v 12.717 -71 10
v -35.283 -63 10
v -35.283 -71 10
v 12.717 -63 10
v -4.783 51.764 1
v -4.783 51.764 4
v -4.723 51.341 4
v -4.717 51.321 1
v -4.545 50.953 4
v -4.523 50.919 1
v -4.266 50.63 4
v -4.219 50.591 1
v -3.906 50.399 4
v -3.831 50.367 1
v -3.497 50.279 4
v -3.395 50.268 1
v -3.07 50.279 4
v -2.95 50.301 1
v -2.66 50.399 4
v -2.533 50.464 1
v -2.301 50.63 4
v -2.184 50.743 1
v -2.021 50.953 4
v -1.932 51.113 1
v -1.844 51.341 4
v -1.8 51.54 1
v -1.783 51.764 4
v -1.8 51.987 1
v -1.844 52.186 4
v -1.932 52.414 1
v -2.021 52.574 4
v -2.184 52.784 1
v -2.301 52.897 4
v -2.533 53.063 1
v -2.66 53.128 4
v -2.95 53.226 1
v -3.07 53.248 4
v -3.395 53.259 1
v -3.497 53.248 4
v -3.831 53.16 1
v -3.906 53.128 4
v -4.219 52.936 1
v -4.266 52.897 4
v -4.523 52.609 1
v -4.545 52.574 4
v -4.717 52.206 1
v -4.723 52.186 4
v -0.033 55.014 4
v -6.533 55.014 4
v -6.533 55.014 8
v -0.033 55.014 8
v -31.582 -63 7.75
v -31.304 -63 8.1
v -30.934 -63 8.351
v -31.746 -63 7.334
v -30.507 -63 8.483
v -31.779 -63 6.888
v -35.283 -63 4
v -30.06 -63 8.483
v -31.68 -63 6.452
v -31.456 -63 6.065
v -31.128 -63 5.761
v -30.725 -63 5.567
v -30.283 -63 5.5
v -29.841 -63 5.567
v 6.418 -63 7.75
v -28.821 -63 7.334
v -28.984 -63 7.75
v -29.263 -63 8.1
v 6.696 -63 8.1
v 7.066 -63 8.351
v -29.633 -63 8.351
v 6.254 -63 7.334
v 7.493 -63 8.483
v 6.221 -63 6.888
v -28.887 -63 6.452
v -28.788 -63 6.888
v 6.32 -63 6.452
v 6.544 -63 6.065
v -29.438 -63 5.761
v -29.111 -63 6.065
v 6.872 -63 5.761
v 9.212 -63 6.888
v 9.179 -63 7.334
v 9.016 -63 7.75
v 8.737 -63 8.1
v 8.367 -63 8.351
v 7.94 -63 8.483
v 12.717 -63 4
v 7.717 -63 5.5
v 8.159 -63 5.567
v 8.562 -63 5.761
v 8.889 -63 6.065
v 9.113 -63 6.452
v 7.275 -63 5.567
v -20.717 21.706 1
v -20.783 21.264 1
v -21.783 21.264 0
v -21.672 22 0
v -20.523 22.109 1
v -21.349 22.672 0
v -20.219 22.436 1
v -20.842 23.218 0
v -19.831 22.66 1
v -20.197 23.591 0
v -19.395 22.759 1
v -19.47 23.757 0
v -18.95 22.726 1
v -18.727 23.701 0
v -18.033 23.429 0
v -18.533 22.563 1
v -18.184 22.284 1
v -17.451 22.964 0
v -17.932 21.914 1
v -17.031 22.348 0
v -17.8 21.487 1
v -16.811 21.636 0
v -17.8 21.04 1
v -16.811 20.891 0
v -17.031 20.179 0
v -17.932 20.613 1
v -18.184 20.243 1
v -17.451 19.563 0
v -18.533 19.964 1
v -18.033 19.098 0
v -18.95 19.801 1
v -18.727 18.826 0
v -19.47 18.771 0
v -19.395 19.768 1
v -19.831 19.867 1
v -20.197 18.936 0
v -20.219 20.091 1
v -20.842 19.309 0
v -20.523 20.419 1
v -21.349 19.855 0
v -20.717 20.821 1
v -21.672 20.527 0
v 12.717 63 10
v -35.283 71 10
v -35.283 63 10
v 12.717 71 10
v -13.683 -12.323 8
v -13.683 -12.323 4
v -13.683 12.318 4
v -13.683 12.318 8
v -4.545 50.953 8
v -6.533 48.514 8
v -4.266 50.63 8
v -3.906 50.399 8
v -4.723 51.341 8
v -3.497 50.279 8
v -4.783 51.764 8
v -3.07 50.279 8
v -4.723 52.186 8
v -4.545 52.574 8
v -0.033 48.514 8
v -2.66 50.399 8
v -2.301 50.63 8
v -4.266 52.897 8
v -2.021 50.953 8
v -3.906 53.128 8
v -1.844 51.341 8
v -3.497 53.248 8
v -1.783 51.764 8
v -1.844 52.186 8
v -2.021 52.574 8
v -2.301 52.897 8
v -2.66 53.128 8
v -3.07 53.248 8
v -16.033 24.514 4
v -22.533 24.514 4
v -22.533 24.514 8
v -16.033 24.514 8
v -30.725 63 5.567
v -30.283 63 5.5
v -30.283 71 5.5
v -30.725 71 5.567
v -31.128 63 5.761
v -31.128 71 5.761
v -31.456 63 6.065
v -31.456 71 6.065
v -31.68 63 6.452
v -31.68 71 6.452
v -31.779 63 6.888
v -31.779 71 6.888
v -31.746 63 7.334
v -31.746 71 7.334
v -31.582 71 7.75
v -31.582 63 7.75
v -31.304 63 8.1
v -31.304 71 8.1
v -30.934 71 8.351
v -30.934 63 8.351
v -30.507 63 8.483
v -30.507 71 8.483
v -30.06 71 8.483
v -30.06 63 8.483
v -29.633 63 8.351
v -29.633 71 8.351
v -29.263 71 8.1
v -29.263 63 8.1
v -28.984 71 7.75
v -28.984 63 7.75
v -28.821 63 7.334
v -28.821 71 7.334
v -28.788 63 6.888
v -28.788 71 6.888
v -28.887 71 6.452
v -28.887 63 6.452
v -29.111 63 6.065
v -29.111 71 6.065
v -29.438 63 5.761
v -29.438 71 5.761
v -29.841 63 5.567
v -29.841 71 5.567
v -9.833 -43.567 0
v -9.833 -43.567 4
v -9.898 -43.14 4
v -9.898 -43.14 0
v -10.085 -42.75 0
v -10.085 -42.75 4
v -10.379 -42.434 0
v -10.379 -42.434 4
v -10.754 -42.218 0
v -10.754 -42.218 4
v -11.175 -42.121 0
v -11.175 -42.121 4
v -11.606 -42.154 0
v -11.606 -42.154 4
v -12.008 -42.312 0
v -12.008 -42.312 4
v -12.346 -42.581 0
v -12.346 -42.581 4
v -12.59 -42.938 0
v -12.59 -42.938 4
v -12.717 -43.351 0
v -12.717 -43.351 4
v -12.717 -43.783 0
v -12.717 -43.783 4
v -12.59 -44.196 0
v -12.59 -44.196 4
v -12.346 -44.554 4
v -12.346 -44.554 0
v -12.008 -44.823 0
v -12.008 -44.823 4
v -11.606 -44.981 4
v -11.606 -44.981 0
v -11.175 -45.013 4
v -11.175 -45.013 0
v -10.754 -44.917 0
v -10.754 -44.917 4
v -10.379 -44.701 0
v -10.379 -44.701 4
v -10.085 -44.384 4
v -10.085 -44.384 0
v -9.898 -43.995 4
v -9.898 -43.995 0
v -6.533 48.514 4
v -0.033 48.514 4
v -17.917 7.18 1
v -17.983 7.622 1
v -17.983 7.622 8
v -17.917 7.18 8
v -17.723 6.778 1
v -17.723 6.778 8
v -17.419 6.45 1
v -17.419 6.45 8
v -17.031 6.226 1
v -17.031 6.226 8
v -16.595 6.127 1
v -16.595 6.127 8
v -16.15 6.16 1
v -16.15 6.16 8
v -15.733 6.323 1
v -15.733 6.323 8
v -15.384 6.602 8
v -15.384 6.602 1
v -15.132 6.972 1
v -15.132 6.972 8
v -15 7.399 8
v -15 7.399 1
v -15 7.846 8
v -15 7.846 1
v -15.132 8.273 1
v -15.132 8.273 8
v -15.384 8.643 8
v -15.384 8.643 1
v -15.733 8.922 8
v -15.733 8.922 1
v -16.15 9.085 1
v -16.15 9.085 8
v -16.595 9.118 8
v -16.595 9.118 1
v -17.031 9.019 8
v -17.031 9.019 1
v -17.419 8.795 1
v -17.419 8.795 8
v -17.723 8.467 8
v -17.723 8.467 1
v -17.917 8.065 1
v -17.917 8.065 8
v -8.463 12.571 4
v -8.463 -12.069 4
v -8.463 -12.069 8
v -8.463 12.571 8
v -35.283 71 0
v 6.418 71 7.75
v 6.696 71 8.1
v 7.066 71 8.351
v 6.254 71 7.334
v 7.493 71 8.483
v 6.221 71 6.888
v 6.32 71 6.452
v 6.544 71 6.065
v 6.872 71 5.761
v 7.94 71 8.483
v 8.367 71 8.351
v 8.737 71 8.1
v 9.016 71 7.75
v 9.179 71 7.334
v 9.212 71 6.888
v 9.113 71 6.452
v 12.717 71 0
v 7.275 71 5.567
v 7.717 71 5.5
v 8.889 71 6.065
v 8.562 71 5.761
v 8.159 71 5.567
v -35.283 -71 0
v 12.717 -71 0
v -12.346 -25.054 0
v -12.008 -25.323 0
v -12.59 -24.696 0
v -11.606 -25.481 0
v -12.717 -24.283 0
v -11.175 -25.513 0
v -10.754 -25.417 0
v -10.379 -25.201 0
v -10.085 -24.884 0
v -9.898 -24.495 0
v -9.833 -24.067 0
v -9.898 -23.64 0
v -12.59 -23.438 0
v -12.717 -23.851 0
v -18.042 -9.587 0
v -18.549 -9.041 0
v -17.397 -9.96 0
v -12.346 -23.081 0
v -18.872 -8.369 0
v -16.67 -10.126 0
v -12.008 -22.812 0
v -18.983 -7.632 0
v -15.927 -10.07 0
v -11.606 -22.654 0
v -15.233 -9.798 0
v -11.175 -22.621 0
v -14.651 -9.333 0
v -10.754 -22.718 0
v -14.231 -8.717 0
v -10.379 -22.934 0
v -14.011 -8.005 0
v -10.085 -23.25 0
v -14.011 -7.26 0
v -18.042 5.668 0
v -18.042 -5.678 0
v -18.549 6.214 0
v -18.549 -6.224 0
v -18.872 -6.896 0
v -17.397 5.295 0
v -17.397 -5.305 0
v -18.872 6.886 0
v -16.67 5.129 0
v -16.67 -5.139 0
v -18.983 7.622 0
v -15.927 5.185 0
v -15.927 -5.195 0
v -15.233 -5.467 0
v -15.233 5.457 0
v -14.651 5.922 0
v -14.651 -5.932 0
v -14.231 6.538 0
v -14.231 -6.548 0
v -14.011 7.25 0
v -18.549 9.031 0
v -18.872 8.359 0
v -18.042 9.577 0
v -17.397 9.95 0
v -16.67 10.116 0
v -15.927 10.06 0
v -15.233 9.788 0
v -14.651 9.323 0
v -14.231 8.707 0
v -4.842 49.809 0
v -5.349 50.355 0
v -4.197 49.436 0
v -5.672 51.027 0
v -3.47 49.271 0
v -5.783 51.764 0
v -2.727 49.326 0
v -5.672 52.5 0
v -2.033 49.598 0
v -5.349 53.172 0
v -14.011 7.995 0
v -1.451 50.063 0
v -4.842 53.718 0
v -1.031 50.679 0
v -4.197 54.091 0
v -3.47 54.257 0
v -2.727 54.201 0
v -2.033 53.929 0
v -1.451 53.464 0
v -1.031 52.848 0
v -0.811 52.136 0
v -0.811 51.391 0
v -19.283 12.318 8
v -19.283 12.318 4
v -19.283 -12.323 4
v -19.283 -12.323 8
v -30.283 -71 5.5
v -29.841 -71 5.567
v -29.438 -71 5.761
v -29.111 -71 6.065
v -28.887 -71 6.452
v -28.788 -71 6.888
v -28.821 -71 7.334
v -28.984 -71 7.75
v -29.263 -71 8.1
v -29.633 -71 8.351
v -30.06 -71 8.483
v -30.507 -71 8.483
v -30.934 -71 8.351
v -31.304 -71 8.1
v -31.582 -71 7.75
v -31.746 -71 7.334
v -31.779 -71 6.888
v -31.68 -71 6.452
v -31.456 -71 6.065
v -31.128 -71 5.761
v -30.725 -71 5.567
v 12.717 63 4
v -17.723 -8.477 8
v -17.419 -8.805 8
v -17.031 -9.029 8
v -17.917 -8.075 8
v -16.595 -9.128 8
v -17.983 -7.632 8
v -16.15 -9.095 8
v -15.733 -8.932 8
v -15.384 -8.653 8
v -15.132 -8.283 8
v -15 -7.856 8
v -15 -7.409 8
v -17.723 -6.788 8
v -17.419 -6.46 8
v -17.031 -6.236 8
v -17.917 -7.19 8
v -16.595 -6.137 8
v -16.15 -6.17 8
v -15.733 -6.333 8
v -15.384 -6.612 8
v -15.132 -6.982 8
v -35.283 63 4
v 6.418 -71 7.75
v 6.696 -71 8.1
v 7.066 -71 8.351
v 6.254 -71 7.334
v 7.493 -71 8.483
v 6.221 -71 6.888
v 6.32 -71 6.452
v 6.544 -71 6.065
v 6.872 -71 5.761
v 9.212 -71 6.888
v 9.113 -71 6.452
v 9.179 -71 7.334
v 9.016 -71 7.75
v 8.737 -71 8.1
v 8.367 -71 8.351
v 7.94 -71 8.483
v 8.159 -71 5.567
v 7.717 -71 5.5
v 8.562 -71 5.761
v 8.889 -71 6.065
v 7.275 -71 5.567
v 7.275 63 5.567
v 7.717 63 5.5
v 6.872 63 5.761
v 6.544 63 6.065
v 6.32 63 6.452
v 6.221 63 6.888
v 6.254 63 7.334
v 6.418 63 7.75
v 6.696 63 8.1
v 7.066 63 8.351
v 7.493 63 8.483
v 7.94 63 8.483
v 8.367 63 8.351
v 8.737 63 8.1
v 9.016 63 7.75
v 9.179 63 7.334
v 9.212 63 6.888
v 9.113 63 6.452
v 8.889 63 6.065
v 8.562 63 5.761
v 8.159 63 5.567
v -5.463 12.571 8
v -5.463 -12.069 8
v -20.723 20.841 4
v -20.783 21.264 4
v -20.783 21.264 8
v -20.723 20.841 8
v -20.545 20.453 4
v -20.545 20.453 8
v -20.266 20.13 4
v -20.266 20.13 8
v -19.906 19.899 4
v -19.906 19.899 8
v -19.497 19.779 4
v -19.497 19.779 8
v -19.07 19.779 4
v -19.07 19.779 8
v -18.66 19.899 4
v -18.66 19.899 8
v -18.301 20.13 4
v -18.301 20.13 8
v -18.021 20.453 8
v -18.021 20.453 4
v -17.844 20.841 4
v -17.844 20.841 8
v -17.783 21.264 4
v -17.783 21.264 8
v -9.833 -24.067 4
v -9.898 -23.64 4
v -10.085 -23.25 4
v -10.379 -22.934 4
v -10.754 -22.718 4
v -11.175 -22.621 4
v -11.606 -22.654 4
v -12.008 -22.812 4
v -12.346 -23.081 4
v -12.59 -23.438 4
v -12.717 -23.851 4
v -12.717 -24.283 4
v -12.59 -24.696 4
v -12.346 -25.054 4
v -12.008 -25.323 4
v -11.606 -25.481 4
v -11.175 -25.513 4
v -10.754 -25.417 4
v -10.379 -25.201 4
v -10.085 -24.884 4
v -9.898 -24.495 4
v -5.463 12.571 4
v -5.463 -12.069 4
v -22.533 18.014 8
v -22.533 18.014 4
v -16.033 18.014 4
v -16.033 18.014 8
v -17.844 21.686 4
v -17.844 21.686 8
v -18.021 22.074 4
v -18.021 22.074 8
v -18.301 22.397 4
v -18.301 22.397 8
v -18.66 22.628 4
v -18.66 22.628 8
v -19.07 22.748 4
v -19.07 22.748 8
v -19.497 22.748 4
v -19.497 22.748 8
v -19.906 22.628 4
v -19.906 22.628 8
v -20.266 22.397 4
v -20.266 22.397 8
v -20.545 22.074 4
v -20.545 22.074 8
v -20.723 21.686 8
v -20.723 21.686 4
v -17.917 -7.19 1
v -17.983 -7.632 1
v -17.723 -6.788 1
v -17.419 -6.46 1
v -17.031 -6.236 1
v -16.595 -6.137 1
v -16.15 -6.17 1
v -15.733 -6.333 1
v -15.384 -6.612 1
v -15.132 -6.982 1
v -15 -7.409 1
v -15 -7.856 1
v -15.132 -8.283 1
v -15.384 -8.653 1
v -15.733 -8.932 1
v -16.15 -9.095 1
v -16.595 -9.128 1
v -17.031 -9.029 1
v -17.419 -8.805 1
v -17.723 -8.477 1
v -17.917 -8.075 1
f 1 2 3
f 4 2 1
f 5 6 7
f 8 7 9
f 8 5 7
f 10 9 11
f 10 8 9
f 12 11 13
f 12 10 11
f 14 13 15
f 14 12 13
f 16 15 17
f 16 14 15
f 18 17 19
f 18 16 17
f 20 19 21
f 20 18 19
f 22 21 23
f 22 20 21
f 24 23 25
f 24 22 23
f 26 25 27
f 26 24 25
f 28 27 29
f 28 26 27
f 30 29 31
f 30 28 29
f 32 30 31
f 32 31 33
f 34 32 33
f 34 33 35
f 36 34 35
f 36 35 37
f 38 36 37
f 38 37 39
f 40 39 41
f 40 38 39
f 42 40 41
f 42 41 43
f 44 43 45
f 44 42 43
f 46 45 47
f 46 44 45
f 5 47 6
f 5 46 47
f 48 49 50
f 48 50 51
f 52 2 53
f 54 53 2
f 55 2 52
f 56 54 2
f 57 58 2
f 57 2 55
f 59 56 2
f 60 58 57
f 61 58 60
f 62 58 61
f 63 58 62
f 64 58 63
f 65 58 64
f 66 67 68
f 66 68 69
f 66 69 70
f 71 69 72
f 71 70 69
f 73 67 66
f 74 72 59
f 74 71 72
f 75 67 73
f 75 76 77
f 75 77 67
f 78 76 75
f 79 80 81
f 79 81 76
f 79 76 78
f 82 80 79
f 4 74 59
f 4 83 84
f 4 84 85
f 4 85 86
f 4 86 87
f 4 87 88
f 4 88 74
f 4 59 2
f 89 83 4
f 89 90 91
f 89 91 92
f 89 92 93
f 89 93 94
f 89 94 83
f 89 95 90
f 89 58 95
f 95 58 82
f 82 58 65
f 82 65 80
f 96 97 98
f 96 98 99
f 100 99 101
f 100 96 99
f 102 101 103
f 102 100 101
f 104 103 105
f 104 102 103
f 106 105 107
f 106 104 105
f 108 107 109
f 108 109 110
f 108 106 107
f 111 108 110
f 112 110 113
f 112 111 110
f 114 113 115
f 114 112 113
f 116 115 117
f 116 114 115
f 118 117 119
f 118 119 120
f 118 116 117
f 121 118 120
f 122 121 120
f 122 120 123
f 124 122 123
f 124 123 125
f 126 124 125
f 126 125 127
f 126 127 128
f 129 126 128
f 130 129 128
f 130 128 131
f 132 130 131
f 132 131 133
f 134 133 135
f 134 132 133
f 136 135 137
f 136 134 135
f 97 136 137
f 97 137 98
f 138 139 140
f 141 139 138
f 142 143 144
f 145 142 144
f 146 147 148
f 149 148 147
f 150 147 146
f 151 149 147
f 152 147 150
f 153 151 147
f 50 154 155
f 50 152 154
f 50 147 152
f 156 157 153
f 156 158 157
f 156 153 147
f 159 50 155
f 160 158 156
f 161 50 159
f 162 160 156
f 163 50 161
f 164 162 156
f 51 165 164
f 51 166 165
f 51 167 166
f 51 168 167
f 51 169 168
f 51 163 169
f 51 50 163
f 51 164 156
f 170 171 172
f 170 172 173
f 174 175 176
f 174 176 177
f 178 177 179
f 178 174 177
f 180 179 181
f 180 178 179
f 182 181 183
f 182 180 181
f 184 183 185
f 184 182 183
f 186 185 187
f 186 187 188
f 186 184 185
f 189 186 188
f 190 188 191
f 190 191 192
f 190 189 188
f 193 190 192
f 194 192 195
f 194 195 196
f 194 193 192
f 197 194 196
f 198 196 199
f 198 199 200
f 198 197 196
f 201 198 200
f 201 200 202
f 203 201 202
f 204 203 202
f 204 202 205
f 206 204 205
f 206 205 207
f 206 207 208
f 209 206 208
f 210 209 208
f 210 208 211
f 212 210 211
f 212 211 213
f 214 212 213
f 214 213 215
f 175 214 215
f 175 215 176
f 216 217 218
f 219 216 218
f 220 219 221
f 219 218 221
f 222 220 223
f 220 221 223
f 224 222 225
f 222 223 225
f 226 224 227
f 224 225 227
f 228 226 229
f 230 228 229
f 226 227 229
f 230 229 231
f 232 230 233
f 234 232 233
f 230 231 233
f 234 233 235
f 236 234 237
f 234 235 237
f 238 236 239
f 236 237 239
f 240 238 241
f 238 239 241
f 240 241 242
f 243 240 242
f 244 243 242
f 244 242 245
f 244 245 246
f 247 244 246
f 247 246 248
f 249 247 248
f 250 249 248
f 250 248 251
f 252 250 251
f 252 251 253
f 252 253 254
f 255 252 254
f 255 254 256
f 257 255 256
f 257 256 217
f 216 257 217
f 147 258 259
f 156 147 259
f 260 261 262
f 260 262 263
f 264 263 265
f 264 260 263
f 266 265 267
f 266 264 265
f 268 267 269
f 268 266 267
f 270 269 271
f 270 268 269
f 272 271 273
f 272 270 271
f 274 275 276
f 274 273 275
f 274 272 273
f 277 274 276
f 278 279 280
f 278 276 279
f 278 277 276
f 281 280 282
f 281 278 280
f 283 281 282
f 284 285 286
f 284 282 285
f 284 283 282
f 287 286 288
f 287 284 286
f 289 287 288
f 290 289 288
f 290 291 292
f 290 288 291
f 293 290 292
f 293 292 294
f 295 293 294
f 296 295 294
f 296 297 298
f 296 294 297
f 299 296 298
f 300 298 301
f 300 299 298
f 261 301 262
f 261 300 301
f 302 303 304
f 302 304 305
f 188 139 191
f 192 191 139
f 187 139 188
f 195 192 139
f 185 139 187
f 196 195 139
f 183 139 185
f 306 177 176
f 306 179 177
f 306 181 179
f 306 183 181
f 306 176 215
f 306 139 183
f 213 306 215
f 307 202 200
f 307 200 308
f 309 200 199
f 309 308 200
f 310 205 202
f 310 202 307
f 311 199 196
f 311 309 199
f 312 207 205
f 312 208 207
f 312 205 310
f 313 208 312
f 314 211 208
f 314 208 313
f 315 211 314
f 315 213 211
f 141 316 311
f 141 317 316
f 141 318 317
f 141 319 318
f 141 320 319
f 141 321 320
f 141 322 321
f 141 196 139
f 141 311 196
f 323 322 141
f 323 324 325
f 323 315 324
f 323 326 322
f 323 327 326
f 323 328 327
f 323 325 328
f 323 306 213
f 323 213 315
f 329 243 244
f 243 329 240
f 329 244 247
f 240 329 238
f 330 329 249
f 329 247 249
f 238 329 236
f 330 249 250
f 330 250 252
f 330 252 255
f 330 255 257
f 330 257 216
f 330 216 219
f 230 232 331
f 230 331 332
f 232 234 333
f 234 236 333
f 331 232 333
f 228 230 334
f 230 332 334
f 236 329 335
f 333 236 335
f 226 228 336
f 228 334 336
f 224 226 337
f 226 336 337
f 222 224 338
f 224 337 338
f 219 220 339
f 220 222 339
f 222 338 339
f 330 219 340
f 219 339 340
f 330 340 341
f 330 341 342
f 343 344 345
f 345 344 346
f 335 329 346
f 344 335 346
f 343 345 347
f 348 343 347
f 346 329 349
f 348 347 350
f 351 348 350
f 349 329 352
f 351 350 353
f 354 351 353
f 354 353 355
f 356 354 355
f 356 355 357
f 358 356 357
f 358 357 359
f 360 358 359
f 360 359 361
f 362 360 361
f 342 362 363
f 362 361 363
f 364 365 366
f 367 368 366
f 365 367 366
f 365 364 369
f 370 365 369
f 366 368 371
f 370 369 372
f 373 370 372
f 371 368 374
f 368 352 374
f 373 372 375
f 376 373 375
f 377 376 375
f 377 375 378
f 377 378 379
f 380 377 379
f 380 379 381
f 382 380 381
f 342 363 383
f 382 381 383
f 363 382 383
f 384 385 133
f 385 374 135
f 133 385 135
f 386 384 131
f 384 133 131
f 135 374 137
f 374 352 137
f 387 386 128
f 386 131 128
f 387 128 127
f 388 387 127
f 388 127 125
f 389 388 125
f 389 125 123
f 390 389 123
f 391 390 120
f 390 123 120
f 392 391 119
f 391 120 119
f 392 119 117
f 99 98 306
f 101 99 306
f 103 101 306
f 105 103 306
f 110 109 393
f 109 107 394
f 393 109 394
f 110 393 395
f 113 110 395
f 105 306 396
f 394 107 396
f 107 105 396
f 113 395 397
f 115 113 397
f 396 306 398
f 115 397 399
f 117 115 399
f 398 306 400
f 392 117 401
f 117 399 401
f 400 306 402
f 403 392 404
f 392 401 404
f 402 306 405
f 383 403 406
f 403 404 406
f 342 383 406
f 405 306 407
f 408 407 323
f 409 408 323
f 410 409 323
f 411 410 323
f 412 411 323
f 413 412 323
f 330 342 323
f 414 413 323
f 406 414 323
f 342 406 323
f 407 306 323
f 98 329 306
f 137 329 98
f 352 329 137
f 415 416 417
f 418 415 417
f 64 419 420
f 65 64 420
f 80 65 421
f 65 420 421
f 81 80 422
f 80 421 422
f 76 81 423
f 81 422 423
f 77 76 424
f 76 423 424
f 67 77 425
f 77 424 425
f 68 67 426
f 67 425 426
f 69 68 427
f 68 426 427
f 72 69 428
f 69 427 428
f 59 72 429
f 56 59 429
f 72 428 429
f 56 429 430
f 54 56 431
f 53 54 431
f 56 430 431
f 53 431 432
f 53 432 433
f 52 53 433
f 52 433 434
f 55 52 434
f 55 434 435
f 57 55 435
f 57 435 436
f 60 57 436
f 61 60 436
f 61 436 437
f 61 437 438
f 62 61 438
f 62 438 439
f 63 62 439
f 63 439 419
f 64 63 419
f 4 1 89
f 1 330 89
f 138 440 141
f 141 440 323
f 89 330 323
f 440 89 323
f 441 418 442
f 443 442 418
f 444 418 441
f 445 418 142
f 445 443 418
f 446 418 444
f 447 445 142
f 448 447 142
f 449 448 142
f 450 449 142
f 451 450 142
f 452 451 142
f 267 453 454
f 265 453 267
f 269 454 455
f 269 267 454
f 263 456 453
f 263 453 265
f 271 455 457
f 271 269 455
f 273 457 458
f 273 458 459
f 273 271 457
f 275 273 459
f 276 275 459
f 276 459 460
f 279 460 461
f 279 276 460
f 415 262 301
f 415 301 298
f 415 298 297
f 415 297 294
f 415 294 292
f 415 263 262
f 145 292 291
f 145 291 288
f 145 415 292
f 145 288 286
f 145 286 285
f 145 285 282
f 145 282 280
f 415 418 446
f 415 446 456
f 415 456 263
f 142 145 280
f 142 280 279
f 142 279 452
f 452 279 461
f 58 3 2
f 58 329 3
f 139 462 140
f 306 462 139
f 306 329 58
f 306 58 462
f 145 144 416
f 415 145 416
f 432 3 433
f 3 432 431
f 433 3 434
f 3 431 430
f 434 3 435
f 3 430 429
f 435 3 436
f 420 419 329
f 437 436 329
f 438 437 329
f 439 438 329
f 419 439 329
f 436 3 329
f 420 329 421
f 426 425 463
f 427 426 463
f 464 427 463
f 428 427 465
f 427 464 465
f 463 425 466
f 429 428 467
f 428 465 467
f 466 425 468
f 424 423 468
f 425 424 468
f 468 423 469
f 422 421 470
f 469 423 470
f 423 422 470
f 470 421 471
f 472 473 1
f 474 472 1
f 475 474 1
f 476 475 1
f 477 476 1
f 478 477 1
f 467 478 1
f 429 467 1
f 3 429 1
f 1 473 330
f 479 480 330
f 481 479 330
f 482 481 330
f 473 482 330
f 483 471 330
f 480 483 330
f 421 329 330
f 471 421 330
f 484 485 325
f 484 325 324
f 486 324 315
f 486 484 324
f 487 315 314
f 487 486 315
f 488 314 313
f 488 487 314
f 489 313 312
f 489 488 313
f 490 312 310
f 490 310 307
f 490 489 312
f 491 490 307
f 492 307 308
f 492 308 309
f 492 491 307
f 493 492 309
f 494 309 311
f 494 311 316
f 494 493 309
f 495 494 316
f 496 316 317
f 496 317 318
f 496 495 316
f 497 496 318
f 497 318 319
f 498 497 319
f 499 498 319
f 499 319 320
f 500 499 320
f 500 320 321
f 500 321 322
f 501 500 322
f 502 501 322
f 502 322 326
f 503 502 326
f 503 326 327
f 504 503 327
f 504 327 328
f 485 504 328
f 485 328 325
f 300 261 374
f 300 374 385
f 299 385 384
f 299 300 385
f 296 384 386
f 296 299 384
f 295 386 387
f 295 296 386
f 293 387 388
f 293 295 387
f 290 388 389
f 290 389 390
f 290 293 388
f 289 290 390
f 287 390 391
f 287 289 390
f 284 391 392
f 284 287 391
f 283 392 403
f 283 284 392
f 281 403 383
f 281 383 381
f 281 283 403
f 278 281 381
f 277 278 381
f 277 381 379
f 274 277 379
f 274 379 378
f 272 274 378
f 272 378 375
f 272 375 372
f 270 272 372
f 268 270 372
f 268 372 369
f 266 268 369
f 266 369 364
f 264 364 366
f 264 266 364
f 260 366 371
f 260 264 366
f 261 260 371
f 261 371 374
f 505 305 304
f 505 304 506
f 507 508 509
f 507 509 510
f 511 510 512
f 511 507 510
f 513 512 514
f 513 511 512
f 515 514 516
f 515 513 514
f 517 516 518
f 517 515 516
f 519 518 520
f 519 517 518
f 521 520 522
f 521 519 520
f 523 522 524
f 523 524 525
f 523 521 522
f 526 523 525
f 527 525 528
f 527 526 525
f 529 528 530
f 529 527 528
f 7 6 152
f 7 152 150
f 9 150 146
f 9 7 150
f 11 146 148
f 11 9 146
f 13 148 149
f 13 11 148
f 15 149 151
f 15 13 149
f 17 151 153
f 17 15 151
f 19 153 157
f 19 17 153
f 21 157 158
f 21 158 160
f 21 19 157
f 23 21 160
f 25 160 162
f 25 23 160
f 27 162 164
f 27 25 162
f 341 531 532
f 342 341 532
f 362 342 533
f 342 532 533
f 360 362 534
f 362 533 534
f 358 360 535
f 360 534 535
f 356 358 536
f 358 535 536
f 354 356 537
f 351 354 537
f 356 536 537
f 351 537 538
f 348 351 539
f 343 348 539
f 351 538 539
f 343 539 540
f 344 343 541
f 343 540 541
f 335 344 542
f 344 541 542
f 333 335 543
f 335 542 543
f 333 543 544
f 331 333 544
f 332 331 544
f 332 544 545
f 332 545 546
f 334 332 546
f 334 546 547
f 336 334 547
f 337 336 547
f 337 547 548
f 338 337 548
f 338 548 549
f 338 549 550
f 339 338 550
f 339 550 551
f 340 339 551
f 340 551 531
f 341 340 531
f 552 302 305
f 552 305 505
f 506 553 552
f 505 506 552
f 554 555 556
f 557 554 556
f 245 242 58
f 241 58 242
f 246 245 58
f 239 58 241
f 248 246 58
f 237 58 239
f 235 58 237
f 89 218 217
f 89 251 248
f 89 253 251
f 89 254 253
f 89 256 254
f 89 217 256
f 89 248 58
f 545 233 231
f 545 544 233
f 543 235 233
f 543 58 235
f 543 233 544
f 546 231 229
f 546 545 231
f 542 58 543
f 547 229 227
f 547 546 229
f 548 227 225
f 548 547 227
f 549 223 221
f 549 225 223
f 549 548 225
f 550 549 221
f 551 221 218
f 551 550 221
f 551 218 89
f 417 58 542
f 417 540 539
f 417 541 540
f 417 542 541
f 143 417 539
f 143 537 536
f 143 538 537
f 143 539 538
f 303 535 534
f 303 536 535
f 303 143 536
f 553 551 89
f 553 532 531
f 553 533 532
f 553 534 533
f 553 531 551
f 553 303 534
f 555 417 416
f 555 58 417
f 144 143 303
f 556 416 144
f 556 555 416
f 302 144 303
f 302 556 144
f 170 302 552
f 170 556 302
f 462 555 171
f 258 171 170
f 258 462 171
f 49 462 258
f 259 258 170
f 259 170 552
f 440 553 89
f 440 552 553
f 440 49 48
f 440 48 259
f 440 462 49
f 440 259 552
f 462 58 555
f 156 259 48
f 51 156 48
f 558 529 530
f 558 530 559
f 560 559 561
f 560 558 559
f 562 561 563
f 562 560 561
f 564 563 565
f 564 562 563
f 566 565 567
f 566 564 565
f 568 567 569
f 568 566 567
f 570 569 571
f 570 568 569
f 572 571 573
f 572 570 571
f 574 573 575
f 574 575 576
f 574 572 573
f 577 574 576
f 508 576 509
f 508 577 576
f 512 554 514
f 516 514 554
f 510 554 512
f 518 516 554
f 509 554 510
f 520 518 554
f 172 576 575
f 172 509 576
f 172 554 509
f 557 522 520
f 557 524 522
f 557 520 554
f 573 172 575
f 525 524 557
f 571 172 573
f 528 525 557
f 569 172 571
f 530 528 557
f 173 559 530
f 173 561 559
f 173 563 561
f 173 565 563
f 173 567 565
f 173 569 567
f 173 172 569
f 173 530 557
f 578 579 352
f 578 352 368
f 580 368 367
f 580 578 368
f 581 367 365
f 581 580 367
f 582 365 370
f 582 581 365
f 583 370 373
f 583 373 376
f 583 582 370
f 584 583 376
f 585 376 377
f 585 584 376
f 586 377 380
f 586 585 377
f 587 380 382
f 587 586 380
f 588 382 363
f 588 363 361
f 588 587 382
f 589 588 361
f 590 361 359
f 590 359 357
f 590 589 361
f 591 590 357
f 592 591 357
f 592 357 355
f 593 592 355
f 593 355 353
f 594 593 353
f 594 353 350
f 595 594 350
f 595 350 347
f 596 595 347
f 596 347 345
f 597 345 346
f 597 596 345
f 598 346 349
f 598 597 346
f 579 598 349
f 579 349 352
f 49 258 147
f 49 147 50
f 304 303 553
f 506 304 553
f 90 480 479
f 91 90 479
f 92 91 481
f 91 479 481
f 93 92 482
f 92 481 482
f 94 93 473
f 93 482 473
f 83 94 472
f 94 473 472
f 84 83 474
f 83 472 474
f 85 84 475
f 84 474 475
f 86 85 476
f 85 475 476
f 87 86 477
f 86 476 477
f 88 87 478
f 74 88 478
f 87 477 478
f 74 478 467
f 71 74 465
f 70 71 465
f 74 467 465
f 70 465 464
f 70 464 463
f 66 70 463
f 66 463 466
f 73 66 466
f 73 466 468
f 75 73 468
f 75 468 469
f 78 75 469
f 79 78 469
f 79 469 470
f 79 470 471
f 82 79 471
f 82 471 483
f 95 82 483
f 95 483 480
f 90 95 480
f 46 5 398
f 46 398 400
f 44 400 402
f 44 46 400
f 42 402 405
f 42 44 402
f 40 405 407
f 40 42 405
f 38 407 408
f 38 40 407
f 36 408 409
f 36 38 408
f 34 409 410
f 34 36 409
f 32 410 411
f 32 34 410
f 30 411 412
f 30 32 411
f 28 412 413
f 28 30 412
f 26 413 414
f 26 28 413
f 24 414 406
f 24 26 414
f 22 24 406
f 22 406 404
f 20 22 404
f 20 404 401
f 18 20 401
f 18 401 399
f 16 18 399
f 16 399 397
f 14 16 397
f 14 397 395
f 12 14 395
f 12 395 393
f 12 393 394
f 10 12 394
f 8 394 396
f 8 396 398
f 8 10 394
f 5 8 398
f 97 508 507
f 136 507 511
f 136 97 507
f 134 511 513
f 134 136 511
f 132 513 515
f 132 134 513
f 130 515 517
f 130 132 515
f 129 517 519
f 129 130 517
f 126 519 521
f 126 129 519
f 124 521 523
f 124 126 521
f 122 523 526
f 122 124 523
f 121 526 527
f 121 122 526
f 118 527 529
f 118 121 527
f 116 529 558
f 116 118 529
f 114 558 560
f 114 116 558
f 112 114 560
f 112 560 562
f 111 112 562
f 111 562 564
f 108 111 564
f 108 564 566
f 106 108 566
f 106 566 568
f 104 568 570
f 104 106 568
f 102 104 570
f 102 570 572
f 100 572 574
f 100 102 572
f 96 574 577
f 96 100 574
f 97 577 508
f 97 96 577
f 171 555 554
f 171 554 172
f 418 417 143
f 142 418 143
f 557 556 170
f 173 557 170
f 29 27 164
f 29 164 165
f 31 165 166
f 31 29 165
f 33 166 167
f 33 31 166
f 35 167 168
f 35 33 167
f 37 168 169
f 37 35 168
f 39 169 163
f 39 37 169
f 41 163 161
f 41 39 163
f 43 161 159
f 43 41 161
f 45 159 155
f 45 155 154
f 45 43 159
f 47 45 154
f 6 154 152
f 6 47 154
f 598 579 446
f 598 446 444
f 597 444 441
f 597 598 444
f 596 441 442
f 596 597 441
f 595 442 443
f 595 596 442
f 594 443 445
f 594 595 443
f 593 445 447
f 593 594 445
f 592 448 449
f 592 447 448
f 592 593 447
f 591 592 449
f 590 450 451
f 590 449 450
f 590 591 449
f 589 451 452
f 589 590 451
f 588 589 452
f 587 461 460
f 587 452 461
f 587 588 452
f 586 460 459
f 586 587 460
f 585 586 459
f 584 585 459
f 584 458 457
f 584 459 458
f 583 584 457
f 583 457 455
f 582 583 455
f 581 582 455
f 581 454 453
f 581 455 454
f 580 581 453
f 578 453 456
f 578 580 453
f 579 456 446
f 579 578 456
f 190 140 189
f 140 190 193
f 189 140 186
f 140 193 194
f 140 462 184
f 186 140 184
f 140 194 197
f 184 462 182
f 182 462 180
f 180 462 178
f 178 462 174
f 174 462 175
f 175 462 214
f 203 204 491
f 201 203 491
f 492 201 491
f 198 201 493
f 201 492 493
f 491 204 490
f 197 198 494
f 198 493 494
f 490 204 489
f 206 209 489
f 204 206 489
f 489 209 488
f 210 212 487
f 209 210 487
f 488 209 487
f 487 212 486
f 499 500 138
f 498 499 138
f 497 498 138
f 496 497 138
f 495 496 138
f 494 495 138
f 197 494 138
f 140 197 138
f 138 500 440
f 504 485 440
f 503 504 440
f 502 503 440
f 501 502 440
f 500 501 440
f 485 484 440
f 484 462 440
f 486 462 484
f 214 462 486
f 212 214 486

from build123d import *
from build123d.topology import SkipClean

# Parameters (mm, degrees)
SZKIC1_W                        = 48
SZKIC1_H                        = 142
DODANIE_WYCI_GNI_CIE1_DEPTH     = 4
DODANIE_WYCI_GNI_CIE3_DEPTH     = 4
WYTNIJ_WYCI_GNI_CIE1_DEPTH      = 55
WYTNIJ_WYCI_GNI_CIE1_DEPTH_BACK = 10
SZKIC3_R                        = 1.5
SZKIC4_W                        = 3
SZKIC4_H                        = 24.64
DODANIE_WYCI_GNI_CIE4_DEPTH     = 4
SZKIC5_W                        = 48
SZKIC5_H                        = 8
DODANIE_WYCI_GNI_CIE5_DEPTH     = 6
SZKIC6_W                        = 48
SZKIC6_H                        = 8
DODANIE_WYCI_GNI_CIE6_DEPTH     = 6
SZKIC9_R                        = 1.5
WYTNIJ_WYCI_GNI_CIE4_DEPTH      = 10
WYTNIJ_WYCI_GNI_CIE5_START      = -10
SZKIC10_R                       = 1.5
WYTNIJ_WYCI_GNI_CIE5_DEPTH      = 10
SZKIC12_W                       = 6.5
SZKIC12_H                       = 6.5
SZKIC12_R                       = 1.5
DODANIE_WYCI_GNI_CIE7_DEPTH     = 4
SZKIC15_R                       = 1.45
WYTNIJ_WYCI_GNI_CIE6_DEPTH      = 10
WYTNIJ_WYCI_GNI_CIE7_START      = -10
SZKIC16_R                       = 1.5
WYTNIJ_WYCI_GNI_CIE7_DEPTH      = 10
SFAZOWANIE1_SIZE                = 1


with BuildPart() as part:
    # Szkic1 → Dodanie-wyciągnięcie1 (new body)
    with BuildSketch(Plane.XY):
        with Locations((-11.283325816, 0)):
            Rectangle(SZKIC1_W, SZKIC1_H)
    extrude(amount=DODANIE_WYCI_GNI_CIE1_DEPTH)

    # Szkic2 → Dodanie-wyciągnięcie3 (add)
    with BuildSketch(Plane.XY.offset(4)):
        Polygon((-13.683325816, 12.317647524), (-19.283325816, 12.317647524), (-19.283325816, -12.322647524), (-16.483325816, -12.322647524), (-13.683325816, -12.322647524), align=None)
    extrude(amount=DODANIE_WYCI_GNI_CIE3_DEPTH)

    # Szkic3 → Wytnij-wyciągnięcie1 (cut, two sides: drawn at the far end of the back side and taken through both)
    with BuildSketch(Plane.XY.offset(8).offset(-WYTNIJ_WYCI_GNI_CIE1_DEPTH_BACK)):
        with Locations(Location((-16.483325816, 7.6225, 0), (0, 0, 180))):
            Circle(SZKIC3_R)
        with Locations(Location((-16.483325816, -7.6325, 0), (0, 0, 180))):
            Circle(SZKIC3_R)
    extrude(amount=WYTNIJ_WYCI_GNI_CIE1_DEPTH + WYTNIJ_WYCI_GNI_CIE1_DEPTH_BACK, mode=Mode.SUBTRACT)

    # Szkic4 → Dodanie-wyciągnięcie4 (add)
    with BuildSketch(Plane.XY.offset(4)):
        with Locations((-6.963325816, 0.250968311)):
            Rectangle(SZKIC4_W, SZKIC4_H)
    extrude(amount=DODANIE_WYCI_GNI_CIE4_DEPTH)

    # Szkic5 → Dodanie-wyciągnięcie5 (add)
    with BuildSketch(Plane.XY.offset(4)):
        with Locations((-11.283325816, 67)):
            Rectangle(SZKIC5_W, SZKIC5_H)
    extrude(amount=DODANIE_WYCI_GNI_CIE5_DEPTH)

    # Szkic6 → Dodanie-wyciągnięcie6 (add)
    with BuildSketch(Plane.XY.offset(4)):
        with Locations((-11.283325816, -67)):
            Rectangle(SZKIC6_W, SZKIC6_H)
    extrude(amount=DODANIE_WYCI_GNI_CIE6_DEPTH)

    # Szkic9 → Wytnij-wyciągnięcie4 (cut)
    with BuildSketch(Plane.XZ.offset(71)):
        with Locations(Location((-30.283325816, 7, 0), (0, 0, 270))):
            Circle(SZKIC9_R)
        with Locations(Location((7.716674184, 7, 0), (0, 0, 270))):
            Circle(SZKIC9_R)
    extrude(amount=-WYTNIJ_WYCI_GNI_CIE4_DEPTH, mode=Mode.SUBTRACT)

    # Szkic10 → Wytnij-wyciągnięcie5 (cut)
    with BuildSketch(Plane(origin=(0, 71, 0), x_dir=(-1, 0, 0), z_dir=(0, 1, 0)).offset(WYTNIJ_WYCI_GNI_CIE5_START)):
        with Locations(Location((-7.716674184, 7, 0), (0, 0, 270))):
            Circle(SZKIC10_R)
        with Locations(Location((30.283325816, 7, 0), (0, 0, 270))):
            Circle(SZKIC10_R)
    extrude(amount=WYTNIJ_WYCI_GNI_CIE5_DEPTH, mode=Mode.SUBTRACT)

    # Szkic12 → Dodanie-wyciągnięcie7 (add)
    # profile 1 of 2: a face of its own
    with BuildSketch(Plane.XY.offset(4)):
        with Locations((-19.283325816, 21.26353769)):
            Rectangle(SZKIC12_W, SZKIC12_H)
        with Locations((-19.283325816, 21.26353769)):
            Circle(SZKIC12_R, mode=Mode.SUBTRACT)
    # profile 2 of 2: a face of its own
    with BuildSketch(Plane.XY.offset(4)):
        with Locations((-3.283325816, 51.76353769)):
            Rectangle(SZKIC12_W, SZKIC12_H)
        with Locations((-3.283325816, 51.76353769)):
            Circle(SZKIC12_R, mode=Mode.SUBTRACT)
    extrude(amount=DODANIE_WYCI_GNI_CIE7_DEPTH)

    # Szkic15 → Wytnij-wyciągnięcie6 (cut)
    with BuildSketch(Plane.XY.offset(4)):
        with Locations((-11.283325816, -24.067309246)):
            Circle(SZKIC15_R)
        with Locations((-11.283325816, -43.567309246)):
            Circle(SZKIC15_R)
    extrude(amount=-WYTNIJ_WYCI_GNI_CIE6_DEPTH, mode=Mode.SUBTRACT)

    # Szkic16 → Wytnij-wyciągnięcie7 (cut)
    with SkipClean():  # the faces are left unmerged after this step: merging them gives an invalid solid
        with BuildSketch(Plane.XY.offset(8).offset(WYTNIJ_WYCI_GNI_CIE7_START)):
            with Locations(Location((-3.283325816, 51.76353769, 0), (0, 0, 180))):
                Circle(SZKIC16_R)
            with Locations(Location((-19.283325816, 21.26353769, 0), (0, 0, 180))):
                Circle(SZKIC16_R)
        extrude(amount=WYTNIJ_WYCI_GNI_CIE7_DEPTH, mode=Mode.SUBTRACT)

    # Sfazowanie1
    sfazowanie1_edges = [part.edges().sort_by_distance(p)[0] for p in [
        (-1.783325816, 51.76353769, 0),
        (-17.783325816, 21.26353769, 0),
        (-14.983325816, -7.6325, 0),
        (-14.983325816, 7.6225, 0),
    ]]
    chamfer(sfazowanie1_edges, length=SFAZOWANIE1_SIZE)


solid = part.part
